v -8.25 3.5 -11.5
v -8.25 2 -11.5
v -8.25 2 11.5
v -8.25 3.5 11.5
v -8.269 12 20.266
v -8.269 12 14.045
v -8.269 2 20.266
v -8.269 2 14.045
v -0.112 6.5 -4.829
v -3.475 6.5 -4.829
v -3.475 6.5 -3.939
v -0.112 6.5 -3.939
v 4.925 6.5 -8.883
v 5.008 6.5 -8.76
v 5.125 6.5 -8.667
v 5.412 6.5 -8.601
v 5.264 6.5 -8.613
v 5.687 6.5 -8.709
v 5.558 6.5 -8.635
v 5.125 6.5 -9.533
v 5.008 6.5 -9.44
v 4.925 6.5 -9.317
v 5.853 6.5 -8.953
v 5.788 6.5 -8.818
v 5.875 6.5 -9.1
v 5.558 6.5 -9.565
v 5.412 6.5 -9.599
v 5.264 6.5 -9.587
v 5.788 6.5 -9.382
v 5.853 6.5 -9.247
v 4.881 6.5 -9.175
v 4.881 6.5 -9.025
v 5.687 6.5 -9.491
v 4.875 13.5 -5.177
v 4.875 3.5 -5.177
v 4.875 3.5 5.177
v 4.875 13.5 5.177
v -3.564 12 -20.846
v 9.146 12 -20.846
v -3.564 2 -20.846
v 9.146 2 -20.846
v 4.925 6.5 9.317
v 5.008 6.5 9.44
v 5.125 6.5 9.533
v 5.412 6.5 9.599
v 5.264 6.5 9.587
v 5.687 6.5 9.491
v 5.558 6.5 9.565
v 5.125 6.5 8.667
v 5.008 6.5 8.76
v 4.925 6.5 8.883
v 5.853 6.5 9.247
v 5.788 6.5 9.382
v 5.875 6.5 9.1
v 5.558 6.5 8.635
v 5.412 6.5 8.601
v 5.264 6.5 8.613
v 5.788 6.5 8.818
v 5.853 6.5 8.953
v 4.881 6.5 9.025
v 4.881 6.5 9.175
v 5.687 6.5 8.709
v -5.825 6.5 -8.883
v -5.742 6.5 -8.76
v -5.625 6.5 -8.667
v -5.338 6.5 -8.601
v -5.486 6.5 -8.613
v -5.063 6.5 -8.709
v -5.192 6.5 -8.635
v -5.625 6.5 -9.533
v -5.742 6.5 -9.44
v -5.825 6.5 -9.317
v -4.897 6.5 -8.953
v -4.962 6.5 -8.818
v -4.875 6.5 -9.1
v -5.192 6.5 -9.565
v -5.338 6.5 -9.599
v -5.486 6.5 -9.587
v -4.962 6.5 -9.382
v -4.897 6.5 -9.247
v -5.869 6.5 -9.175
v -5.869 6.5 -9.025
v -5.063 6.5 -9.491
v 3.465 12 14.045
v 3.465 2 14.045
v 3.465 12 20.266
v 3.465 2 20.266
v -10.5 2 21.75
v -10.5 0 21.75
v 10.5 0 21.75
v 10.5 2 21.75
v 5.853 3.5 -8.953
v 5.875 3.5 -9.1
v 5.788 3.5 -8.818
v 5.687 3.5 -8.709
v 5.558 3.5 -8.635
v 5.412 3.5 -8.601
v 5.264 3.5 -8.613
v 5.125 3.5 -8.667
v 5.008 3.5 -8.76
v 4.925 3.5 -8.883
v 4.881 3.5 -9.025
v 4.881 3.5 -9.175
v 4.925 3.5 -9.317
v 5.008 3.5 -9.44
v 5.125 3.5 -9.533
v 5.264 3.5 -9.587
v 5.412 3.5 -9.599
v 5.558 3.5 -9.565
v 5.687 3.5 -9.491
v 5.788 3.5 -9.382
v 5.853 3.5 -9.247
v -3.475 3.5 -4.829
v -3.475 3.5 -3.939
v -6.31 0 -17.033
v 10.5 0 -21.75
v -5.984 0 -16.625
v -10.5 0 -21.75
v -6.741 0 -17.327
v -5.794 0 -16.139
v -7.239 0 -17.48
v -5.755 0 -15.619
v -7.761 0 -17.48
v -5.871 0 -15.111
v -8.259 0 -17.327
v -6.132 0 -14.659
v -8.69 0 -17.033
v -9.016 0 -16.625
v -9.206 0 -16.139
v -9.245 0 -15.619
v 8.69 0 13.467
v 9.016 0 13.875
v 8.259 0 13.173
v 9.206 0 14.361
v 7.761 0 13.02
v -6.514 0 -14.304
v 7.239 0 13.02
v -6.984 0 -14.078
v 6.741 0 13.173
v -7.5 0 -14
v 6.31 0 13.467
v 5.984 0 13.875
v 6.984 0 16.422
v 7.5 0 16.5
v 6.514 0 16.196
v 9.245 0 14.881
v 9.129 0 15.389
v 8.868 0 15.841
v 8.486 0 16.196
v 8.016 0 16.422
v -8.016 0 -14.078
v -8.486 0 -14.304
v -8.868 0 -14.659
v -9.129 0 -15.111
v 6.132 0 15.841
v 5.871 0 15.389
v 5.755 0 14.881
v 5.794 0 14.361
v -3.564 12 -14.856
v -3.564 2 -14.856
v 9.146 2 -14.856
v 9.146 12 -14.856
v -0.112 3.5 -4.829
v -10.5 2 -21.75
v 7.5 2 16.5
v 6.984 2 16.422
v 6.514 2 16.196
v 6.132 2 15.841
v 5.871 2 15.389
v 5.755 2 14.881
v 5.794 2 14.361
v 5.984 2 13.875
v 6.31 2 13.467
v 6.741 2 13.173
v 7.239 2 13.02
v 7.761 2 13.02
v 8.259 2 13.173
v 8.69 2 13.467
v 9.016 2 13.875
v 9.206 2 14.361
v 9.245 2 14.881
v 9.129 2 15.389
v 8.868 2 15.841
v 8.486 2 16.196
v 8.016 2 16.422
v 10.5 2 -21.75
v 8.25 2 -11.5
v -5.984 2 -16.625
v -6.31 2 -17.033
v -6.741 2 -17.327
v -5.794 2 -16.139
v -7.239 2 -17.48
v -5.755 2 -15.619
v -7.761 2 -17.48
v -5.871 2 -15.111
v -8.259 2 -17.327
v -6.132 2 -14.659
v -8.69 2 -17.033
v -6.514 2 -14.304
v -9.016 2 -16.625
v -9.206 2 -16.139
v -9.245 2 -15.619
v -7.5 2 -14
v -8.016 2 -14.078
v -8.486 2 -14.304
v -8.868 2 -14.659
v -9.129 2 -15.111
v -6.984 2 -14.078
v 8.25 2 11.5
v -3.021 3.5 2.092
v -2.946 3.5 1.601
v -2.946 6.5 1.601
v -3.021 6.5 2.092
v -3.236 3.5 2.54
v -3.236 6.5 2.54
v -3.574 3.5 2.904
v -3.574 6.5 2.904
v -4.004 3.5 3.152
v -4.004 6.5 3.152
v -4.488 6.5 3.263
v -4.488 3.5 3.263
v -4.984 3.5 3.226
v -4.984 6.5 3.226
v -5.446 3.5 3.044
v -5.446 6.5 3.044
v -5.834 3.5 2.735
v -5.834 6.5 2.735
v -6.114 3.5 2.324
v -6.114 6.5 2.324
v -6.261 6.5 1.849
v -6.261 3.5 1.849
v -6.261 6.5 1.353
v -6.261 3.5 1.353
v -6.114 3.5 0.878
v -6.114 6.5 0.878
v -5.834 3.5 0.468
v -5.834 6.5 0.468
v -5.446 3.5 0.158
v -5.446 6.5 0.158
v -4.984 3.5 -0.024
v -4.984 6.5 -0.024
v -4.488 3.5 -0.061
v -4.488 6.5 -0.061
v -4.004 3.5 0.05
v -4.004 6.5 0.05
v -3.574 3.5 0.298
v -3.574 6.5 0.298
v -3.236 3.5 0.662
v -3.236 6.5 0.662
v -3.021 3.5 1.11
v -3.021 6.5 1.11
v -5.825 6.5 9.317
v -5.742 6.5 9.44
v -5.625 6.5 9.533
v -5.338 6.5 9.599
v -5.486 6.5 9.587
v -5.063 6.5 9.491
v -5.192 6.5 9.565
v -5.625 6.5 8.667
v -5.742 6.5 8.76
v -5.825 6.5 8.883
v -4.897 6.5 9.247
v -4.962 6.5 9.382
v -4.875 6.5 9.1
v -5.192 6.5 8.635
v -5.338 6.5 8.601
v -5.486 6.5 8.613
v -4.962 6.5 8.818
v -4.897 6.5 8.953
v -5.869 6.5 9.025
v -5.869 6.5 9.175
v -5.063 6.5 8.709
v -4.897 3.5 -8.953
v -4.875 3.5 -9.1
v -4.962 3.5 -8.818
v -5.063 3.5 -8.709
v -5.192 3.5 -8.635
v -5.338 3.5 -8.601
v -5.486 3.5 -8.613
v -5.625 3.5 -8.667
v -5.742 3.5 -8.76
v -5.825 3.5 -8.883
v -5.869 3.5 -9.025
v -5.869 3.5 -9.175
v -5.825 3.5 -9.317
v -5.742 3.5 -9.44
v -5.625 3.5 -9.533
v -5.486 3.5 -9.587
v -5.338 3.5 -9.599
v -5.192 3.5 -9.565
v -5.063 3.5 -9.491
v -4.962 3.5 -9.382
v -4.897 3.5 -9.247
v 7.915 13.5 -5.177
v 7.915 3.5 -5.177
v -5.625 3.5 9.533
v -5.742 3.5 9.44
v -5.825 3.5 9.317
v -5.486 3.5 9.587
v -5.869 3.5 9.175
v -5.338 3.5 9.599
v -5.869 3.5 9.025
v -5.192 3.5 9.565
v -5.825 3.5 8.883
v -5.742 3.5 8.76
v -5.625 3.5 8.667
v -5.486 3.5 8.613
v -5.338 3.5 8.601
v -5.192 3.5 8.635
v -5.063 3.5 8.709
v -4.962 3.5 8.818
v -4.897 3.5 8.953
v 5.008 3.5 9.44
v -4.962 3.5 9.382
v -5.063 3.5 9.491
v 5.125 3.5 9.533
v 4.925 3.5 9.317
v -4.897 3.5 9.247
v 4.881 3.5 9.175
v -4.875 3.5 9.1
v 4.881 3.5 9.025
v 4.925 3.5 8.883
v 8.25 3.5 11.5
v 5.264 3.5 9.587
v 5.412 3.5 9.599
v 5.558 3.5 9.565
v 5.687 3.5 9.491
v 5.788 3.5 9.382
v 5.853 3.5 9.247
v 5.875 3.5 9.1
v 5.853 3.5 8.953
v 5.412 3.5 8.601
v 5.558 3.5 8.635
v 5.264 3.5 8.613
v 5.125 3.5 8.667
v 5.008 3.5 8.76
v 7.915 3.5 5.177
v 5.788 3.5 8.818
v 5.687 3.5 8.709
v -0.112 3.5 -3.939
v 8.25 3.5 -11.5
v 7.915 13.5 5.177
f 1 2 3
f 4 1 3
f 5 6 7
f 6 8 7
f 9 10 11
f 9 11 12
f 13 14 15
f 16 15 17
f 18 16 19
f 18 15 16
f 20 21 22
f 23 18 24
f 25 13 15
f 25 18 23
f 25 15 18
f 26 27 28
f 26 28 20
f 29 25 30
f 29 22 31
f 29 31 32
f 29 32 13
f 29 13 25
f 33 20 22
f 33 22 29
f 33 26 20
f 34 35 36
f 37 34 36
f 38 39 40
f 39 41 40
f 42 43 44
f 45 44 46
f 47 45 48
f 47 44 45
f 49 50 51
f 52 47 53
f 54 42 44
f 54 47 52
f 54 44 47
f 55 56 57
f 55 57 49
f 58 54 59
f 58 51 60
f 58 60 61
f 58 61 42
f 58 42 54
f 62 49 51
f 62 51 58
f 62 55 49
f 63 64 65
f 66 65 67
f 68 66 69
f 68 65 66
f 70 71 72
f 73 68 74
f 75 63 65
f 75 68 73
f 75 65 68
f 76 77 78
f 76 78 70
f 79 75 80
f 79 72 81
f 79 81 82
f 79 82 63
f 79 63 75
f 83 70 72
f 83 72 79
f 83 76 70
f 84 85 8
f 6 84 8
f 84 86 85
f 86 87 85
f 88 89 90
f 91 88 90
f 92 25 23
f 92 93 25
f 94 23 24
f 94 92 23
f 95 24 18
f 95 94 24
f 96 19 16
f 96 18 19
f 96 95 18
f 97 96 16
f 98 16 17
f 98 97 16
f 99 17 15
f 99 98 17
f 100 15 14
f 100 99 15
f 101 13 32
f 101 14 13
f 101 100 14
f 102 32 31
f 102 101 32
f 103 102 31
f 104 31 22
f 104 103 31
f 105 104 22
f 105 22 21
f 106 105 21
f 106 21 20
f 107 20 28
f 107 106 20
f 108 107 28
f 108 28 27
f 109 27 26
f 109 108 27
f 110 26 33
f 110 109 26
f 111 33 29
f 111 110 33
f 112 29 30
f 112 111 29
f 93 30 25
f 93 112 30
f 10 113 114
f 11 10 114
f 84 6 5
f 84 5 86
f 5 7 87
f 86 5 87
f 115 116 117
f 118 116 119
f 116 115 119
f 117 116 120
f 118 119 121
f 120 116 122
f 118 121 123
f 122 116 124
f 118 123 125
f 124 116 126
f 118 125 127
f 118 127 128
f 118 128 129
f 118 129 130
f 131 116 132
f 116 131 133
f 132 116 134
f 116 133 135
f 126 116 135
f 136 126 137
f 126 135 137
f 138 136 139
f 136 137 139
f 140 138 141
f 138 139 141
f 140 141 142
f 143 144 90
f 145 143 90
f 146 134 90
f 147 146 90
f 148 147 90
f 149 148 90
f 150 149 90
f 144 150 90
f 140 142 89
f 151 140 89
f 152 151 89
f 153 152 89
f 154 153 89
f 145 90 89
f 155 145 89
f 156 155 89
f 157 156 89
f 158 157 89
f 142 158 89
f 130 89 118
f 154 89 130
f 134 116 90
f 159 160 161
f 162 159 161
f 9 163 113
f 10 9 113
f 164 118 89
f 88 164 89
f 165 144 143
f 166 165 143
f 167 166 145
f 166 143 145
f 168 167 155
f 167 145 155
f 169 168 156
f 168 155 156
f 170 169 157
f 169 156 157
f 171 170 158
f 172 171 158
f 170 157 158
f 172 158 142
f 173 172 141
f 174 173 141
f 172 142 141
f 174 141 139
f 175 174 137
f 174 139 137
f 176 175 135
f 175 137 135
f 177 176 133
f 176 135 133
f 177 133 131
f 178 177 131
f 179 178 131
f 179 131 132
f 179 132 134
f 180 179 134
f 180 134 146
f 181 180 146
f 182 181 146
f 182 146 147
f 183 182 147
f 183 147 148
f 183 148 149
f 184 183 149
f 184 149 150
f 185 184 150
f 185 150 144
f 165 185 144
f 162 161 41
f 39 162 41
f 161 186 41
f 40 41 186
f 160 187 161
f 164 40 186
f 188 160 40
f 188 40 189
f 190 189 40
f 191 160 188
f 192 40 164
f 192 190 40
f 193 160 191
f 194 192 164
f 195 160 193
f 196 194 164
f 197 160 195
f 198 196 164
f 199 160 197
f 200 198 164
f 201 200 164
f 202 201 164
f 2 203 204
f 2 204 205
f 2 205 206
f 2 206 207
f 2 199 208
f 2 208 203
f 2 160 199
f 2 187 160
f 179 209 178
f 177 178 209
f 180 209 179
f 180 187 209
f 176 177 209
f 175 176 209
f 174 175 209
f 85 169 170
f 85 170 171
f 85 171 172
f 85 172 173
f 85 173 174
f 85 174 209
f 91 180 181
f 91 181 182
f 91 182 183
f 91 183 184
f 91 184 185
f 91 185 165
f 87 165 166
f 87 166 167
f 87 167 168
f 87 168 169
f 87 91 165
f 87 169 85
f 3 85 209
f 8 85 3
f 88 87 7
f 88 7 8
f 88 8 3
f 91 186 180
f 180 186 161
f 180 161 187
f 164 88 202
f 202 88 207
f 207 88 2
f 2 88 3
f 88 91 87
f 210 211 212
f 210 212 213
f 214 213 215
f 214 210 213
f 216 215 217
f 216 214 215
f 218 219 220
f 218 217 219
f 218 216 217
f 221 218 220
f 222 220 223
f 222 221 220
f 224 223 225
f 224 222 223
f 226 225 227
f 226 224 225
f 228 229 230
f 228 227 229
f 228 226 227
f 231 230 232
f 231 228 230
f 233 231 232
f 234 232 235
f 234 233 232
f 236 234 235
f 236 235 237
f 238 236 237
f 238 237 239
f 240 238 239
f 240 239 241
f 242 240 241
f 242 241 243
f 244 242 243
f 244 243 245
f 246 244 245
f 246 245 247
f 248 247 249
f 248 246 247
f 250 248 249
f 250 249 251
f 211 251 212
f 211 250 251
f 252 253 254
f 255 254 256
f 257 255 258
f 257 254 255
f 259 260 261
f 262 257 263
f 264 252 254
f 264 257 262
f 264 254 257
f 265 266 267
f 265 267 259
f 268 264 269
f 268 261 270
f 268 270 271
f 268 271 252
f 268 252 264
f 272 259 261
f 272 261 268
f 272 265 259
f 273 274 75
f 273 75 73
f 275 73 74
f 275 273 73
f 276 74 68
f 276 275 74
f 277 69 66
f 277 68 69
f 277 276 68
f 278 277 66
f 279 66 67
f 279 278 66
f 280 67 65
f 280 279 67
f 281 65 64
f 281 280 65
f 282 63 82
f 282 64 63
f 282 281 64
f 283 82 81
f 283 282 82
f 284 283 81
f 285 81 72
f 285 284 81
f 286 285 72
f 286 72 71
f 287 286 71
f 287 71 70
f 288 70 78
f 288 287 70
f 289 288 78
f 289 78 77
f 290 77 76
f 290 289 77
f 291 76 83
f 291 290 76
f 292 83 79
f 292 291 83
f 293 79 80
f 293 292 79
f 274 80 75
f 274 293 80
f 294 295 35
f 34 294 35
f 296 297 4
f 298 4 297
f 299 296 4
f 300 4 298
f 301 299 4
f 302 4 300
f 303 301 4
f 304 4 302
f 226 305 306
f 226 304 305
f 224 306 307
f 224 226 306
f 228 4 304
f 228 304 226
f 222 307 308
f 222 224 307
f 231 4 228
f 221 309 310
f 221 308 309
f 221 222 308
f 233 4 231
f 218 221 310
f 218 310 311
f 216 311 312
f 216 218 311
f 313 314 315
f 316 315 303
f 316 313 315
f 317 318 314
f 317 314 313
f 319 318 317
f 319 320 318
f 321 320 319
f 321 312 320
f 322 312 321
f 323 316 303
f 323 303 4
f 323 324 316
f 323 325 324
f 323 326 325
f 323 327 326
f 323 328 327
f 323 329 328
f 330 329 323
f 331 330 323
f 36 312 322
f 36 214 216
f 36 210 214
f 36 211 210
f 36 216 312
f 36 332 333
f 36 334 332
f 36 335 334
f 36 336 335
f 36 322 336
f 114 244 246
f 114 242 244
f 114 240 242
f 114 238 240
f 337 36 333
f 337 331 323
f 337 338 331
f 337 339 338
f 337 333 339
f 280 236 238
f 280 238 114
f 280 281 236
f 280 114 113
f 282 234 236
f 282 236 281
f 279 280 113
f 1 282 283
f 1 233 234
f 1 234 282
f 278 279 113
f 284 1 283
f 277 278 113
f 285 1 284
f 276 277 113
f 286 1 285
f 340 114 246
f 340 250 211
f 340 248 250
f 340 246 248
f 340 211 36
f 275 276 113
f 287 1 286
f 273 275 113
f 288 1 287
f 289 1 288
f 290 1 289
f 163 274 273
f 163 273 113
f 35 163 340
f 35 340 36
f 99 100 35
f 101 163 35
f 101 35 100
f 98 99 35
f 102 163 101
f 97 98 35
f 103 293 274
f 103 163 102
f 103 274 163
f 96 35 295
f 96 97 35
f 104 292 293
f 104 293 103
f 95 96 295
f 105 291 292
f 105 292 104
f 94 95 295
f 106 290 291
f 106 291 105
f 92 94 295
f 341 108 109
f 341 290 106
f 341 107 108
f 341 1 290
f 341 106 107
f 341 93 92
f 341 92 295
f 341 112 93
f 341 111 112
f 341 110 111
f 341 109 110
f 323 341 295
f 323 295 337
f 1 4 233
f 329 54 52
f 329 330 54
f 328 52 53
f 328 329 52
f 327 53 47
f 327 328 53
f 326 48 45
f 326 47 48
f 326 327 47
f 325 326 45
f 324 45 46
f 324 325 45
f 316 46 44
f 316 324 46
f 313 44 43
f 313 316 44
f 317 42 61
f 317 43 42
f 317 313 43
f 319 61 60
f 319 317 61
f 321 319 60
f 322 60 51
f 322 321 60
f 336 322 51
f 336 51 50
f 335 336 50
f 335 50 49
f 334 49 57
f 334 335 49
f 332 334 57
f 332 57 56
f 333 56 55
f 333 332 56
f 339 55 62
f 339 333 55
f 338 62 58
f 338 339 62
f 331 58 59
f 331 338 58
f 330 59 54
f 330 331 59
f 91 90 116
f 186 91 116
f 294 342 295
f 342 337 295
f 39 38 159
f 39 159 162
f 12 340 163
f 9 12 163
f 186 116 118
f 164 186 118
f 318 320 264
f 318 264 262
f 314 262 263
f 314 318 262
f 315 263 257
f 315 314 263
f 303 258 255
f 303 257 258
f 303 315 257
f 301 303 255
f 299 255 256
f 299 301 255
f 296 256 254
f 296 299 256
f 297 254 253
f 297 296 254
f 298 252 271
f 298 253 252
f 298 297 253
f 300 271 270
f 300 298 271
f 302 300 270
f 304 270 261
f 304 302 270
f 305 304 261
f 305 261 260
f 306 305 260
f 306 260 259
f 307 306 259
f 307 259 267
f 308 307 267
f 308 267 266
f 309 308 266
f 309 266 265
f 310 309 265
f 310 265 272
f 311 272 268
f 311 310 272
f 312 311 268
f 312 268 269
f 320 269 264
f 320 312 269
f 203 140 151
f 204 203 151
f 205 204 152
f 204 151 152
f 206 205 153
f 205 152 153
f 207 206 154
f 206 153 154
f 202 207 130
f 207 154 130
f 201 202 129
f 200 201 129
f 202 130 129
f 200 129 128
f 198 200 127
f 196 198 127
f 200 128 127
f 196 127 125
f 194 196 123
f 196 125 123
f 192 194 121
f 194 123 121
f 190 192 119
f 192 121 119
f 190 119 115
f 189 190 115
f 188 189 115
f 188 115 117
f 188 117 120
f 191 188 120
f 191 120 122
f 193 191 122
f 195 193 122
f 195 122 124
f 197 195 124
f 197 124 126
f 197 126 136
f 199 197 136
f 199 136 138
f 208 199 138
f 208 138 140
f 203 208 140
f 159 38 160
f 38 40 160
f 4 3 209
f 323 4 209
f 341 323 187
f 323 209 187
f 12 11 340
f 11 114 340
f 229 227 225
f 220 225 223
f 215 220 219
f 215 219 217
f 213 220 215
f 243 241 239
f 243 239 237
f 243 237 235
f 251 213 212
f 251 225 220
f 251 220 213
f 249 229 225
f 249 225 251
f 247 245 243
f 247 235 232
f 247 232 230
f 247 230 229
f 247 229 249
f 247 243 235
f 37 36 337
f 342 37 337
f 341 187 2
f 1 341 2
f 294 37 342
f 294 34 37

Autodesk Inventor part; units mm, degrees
ref_plane "YZ Plane" through (0, 0, 0) normal (1, 0, 0) x (0, 1, 0)
ref_plane "XZ Plane" through (0, 0, 0) normal (0, 1, 0) x (-1, 0, 0)
ref_plane "XY Plane" through (0, 0, 0) normal (0, 0, 1) x (1, 0, 0)
sketch "Szkic1" plane through (0, 0, 0) normal (0, 1, 0) x (-1, 0, 0)
  line L0 (-10.5, -21.75) -> (10.5, -21.75)
  line L1 (10.5, -21.75) -> (10.5, 21.75)
  line L2 (10.5, 21.75) -> (-10.5, 21.75)
  line L3 (-10.5, 21.75) -> (-10.5, -21.75)
  line L4 (-10.5, -21.75) -> (10.5, 21.75) construction
  line L5 (10.5, -21.75) -> (-10.5, 21.75) construction
  point P0 (0, 0)
  dimension "d0" = 21
  dimension "d1" = 43.5
extrude "Wyciągnięcie proste1" add sketch "Szkic1" along normal blind 2
sketch "Szkic2" plane through (0, 2, 0) normal (0, 1, 0) x (1, 0, 0)
  line L0 (-10.5, 21.75) -> (-10.5, -21.75) projected
  line L1 (-10.5, -21.75) -> (10.5, -21.75) projected
  line L2 (10.5, 21.75) -> (-10.5, 21.75) projected
  line L3 (10.5, -21.75) -> (10.5, 21.75) projected
  line L4 (0, 21.75) -> (0, -21.75)
  point P0 (0, 0)
  point P1 (7.5, -14.75)
  point P2 (-7.5, 15.75)
  dimension "d40" = 10.5
  dimension "d41" = 10.5
hole "Otwór1" at (7.5, 2, 14.75) at (-7.5, 2, -15.75) direction (0, -1, 0) diameter 3.5 end through all
sketch "Szkic3" plane through (0, 2, 0) normal (0, 1, 0) x (1, 0, 0)
  line L0 (8.25, 11.5) -> (-8.25, 11.5)
  line L1 (-8.25, 11.5) -> (-8.25, -11.5)
  line L2 (-8.25, -11.5) -> (8.25, -11.5)
  line L3 (8.25, -11.5) -> (8.25, 11.5)
  line L4 (8.25, 11.5) -> (-8.25, -11.5) construction
  line L5 (-8.25, 11.5) -> (8.25, -11.5) construction
  point P0 (0, 0)
  dimension "d15" = 16.5
  dimension "d16" = 23
extrude "Wyciągnięcie proste2" add sketch "Szkic3" along normal blind 1.5
sketch "Szkic4" plane through (0, 3.5, 0) normal (0, 1, 0) x (1, 0, 0)
  line L0 (8.25, 11.5) -> (-8.25, 11.5) projected
  line L1 (-8.25, 11.5) -> (-8.25, -11.5) projected
  line L2 (-8.25, -11.5) -> (8.25, -11.5) projected
  line L3 (8.25, -11.5) -> (8.25, 11.5) projected
  circle A0 centre (-5.375, -9.1) radius 0.5
  circle A1 centre (5.375, -9.1) radius 0.5
  circle A2 centre (5.375, 9.1) radius 0.5
  circle A3 centre (-5.375, 9.1) radius 0.5
  circle A4 centre (-4.6129, -1.6011) radius 1.6664
  line L4 (-0.1119, 4.829) -> (-3.4753, 4.829)
  line L5 (-3.4753, 4.829) -> (-3.4753, 3.9387)
  line L6 (-3.4753, 3.9387) -> (-0.1119, 3.9387)
  line L7 (-0.1119, 3.9387) -> (-0.1119, 4.829)
  line L8 (-0.1119, 4.829) -> (-3.4753, 3.9387) construction
  line L9 (-3.4753, 4.829) -> (-0.1119, 3.9387) construction
  point P0 (0, 0)
  point P1 (-1.7936, 4.3838)
  dimension "d19" = 10.75
  dimension "d20" = 10.75
  dimension "d21" = 2.875
  dimension "d22" = 2.875
  dimension "d23" = 2.875
  dimension "d24" = 2.875
  dimension "d25" = 18.2
  dimension "d26" = 18.2
  dimension "d27" = 2.4
  dimension "d28" = 2.4
  dimension "d29" = 2.4
  dimension "d30" = 1
  dimension "d31" = 1
  dimension "d32" = 1
  dimension "d33" = 1
extrude "Wyciągnięcie proste3" add sketch "Szkic4" along normal blind 3 contours A0 | A1 | A2 | A3 | A4 | L7 L6 L5 L4
sketch "Szkic5" plane through (0, 3.5, 0) normal (0, 1, 0) x (1, 0, 0)
  line L0 (-0.1119, 4.829) -> (-0.1119, 3.9387) projected
  line L1 (-0.1119, 3.9387) -> (-3.4753, 3.9387) projected
  line L2 (-3.4753, 3.9387) -> (-3.4753, 4.829) projected
  line L3 (-3.4753, 4.829) -> (-0.1119, 4.829) projected
  circle A0 centre (5.375, 9.1) radius 0.5 projected
  circle A1 centre (-5.375, -9.1) radius 0.5 projected
  circle A2 centre (5.375, -9.1) radius 0.5 projected
  circle A3 centre (-5.375, 9.1) radius 0.5 projected
  circle A4 centre (-4.6129, -1.6011) radius 1.6664 projected
  line L4 (8.25, 11.5) -> (-8.25, 11.5) projected
  line L5 (-8.25, 11.5) -> (-8.25, -11.5) projected
  line L6 (-8.25, -11.5) -> (8.25, -11.5) projected
  line L7 (8.25, -11.5) -> (8.25, 11.5) projected
  line L8 (7.9153, 5.177) -> (4.875, 5.177)
  line L9 (4.875, 5.177) -> (4.875, -5.177)
  line L10 (4.875, -5.177) -> (7.9153, -5.177)
  line L11 (7.9153, -5.177) -> (7.9153, 5.177)
  line L12 (7.9153, 5.177) -> (4.875, -5.177) construction
  line L13 (4.875, 5.177) -> (7.9153, -5.177) construction
  point P0 (0, 0)
  point P1 (6.3951, 0)
extrude "Wyciągnięcie proste4" add sketch "Szkic5" along normal blind 10 contours L11 L10 L9 L8
sketch "Szkic6" plane through (0, 2, 0) normal (0, 1, 0) x (1, 0, 0)
  line L0 (7.9153, 5.177) -> (7.9153, -5.177) projected
  line L1 (7.9153, -5.177) -> (4.875, -5.177) projected
  line L2 (4.875, -5.177) -> (4.875, 5.177) projected
  line L3 (4.875, 5.177) -> (7.9153, 5.177) projected
  line L4 (-0.1119, 4.829) -> (-0.1119, 3.9387) projected
  line L5 (-0.1119, 3.9387) -> (-3.4753, 3.9387) projected
  line L6 (-3.4753, 3.9387) -> (-3.4753, 4.829) projected
  line L7 (-3.4753, 4.829) -> (-0.1119, 4.829) projected
  circle A0 centre (5.375, 9.1) radius 0.5 projected
  circle A1 centre (-5.375, -9.1) radius 0.5 projected
  circle A2 centre (5.375, -9.1) radius 0.5 projected
  circle A3 centre (-5.375, 9.1) radius 0.5 projected
  circle A4 centre (-4.6129, -1.6011) radius 1.6664 projected
  line L8 (8.25, 11.5) -> (-8.25, 11.5) projected
  line L9 (-8.25, 11.5) -> (-8.25, -11.5) projected
  line L10 (-8.25, -11.5) -> (8.25, -11.5) projected
  line L11 (8.25, -11.5) -> (8.25, 11.5) projected
  line L12 (3.4647, -14.0449) -> (-8.2686, -14.0449)
  line L13 (-8.2686, -14.0449) -> (-8.2686, -20.2659)
  line L14 (-8.2686, -20.2659) -> (3.4647, -20.2659)
  line L15 (3.4647, -20.2659) -> (3.4647, -14.0449)
  line L16 (3.4647, -14.0449) -> (-8.2686, -20.2659) construction
  line L17 (-8.2686, -14.0449) -> (3.4647, -20.2659) construction
  line L18 (9.146, 20.8464) -> (-3.5644, 20.8464)
  line L19 (-3.5644, 20.8464) -> (-3.5644, 14.8558)
  line L20 (-3.5644, 14.8558) -> (9.146, 14.8558)
  line L21 (9.146, 14.8558) -> (9.146, 20.8464)
  line L22 (9.146, 20.8464) -> (-3.5644, 14.8558) construction
  line L23 (-3.5644, 20.8464) -> (9.146, 14.8558) construction
  point P0 (0, 0)
  point P1 (-2.4019, -17.1554)
  point P2 (2.7908, 17.8511)
extrude "Wyciągnięcie proste5" add sketch "Szkic6" along normal blind 10 contours L15 L14 L13 L12 | L21 L20 L19 L18
equation "\"d20\" = d19"
equation "\"d21\" = d22"
equation "\"d23\" = d24"
equation "\"d26\" = d25"
equation "\"d27\" = d28"
equation "\"d29\" = d27"
properties part number "step down"
